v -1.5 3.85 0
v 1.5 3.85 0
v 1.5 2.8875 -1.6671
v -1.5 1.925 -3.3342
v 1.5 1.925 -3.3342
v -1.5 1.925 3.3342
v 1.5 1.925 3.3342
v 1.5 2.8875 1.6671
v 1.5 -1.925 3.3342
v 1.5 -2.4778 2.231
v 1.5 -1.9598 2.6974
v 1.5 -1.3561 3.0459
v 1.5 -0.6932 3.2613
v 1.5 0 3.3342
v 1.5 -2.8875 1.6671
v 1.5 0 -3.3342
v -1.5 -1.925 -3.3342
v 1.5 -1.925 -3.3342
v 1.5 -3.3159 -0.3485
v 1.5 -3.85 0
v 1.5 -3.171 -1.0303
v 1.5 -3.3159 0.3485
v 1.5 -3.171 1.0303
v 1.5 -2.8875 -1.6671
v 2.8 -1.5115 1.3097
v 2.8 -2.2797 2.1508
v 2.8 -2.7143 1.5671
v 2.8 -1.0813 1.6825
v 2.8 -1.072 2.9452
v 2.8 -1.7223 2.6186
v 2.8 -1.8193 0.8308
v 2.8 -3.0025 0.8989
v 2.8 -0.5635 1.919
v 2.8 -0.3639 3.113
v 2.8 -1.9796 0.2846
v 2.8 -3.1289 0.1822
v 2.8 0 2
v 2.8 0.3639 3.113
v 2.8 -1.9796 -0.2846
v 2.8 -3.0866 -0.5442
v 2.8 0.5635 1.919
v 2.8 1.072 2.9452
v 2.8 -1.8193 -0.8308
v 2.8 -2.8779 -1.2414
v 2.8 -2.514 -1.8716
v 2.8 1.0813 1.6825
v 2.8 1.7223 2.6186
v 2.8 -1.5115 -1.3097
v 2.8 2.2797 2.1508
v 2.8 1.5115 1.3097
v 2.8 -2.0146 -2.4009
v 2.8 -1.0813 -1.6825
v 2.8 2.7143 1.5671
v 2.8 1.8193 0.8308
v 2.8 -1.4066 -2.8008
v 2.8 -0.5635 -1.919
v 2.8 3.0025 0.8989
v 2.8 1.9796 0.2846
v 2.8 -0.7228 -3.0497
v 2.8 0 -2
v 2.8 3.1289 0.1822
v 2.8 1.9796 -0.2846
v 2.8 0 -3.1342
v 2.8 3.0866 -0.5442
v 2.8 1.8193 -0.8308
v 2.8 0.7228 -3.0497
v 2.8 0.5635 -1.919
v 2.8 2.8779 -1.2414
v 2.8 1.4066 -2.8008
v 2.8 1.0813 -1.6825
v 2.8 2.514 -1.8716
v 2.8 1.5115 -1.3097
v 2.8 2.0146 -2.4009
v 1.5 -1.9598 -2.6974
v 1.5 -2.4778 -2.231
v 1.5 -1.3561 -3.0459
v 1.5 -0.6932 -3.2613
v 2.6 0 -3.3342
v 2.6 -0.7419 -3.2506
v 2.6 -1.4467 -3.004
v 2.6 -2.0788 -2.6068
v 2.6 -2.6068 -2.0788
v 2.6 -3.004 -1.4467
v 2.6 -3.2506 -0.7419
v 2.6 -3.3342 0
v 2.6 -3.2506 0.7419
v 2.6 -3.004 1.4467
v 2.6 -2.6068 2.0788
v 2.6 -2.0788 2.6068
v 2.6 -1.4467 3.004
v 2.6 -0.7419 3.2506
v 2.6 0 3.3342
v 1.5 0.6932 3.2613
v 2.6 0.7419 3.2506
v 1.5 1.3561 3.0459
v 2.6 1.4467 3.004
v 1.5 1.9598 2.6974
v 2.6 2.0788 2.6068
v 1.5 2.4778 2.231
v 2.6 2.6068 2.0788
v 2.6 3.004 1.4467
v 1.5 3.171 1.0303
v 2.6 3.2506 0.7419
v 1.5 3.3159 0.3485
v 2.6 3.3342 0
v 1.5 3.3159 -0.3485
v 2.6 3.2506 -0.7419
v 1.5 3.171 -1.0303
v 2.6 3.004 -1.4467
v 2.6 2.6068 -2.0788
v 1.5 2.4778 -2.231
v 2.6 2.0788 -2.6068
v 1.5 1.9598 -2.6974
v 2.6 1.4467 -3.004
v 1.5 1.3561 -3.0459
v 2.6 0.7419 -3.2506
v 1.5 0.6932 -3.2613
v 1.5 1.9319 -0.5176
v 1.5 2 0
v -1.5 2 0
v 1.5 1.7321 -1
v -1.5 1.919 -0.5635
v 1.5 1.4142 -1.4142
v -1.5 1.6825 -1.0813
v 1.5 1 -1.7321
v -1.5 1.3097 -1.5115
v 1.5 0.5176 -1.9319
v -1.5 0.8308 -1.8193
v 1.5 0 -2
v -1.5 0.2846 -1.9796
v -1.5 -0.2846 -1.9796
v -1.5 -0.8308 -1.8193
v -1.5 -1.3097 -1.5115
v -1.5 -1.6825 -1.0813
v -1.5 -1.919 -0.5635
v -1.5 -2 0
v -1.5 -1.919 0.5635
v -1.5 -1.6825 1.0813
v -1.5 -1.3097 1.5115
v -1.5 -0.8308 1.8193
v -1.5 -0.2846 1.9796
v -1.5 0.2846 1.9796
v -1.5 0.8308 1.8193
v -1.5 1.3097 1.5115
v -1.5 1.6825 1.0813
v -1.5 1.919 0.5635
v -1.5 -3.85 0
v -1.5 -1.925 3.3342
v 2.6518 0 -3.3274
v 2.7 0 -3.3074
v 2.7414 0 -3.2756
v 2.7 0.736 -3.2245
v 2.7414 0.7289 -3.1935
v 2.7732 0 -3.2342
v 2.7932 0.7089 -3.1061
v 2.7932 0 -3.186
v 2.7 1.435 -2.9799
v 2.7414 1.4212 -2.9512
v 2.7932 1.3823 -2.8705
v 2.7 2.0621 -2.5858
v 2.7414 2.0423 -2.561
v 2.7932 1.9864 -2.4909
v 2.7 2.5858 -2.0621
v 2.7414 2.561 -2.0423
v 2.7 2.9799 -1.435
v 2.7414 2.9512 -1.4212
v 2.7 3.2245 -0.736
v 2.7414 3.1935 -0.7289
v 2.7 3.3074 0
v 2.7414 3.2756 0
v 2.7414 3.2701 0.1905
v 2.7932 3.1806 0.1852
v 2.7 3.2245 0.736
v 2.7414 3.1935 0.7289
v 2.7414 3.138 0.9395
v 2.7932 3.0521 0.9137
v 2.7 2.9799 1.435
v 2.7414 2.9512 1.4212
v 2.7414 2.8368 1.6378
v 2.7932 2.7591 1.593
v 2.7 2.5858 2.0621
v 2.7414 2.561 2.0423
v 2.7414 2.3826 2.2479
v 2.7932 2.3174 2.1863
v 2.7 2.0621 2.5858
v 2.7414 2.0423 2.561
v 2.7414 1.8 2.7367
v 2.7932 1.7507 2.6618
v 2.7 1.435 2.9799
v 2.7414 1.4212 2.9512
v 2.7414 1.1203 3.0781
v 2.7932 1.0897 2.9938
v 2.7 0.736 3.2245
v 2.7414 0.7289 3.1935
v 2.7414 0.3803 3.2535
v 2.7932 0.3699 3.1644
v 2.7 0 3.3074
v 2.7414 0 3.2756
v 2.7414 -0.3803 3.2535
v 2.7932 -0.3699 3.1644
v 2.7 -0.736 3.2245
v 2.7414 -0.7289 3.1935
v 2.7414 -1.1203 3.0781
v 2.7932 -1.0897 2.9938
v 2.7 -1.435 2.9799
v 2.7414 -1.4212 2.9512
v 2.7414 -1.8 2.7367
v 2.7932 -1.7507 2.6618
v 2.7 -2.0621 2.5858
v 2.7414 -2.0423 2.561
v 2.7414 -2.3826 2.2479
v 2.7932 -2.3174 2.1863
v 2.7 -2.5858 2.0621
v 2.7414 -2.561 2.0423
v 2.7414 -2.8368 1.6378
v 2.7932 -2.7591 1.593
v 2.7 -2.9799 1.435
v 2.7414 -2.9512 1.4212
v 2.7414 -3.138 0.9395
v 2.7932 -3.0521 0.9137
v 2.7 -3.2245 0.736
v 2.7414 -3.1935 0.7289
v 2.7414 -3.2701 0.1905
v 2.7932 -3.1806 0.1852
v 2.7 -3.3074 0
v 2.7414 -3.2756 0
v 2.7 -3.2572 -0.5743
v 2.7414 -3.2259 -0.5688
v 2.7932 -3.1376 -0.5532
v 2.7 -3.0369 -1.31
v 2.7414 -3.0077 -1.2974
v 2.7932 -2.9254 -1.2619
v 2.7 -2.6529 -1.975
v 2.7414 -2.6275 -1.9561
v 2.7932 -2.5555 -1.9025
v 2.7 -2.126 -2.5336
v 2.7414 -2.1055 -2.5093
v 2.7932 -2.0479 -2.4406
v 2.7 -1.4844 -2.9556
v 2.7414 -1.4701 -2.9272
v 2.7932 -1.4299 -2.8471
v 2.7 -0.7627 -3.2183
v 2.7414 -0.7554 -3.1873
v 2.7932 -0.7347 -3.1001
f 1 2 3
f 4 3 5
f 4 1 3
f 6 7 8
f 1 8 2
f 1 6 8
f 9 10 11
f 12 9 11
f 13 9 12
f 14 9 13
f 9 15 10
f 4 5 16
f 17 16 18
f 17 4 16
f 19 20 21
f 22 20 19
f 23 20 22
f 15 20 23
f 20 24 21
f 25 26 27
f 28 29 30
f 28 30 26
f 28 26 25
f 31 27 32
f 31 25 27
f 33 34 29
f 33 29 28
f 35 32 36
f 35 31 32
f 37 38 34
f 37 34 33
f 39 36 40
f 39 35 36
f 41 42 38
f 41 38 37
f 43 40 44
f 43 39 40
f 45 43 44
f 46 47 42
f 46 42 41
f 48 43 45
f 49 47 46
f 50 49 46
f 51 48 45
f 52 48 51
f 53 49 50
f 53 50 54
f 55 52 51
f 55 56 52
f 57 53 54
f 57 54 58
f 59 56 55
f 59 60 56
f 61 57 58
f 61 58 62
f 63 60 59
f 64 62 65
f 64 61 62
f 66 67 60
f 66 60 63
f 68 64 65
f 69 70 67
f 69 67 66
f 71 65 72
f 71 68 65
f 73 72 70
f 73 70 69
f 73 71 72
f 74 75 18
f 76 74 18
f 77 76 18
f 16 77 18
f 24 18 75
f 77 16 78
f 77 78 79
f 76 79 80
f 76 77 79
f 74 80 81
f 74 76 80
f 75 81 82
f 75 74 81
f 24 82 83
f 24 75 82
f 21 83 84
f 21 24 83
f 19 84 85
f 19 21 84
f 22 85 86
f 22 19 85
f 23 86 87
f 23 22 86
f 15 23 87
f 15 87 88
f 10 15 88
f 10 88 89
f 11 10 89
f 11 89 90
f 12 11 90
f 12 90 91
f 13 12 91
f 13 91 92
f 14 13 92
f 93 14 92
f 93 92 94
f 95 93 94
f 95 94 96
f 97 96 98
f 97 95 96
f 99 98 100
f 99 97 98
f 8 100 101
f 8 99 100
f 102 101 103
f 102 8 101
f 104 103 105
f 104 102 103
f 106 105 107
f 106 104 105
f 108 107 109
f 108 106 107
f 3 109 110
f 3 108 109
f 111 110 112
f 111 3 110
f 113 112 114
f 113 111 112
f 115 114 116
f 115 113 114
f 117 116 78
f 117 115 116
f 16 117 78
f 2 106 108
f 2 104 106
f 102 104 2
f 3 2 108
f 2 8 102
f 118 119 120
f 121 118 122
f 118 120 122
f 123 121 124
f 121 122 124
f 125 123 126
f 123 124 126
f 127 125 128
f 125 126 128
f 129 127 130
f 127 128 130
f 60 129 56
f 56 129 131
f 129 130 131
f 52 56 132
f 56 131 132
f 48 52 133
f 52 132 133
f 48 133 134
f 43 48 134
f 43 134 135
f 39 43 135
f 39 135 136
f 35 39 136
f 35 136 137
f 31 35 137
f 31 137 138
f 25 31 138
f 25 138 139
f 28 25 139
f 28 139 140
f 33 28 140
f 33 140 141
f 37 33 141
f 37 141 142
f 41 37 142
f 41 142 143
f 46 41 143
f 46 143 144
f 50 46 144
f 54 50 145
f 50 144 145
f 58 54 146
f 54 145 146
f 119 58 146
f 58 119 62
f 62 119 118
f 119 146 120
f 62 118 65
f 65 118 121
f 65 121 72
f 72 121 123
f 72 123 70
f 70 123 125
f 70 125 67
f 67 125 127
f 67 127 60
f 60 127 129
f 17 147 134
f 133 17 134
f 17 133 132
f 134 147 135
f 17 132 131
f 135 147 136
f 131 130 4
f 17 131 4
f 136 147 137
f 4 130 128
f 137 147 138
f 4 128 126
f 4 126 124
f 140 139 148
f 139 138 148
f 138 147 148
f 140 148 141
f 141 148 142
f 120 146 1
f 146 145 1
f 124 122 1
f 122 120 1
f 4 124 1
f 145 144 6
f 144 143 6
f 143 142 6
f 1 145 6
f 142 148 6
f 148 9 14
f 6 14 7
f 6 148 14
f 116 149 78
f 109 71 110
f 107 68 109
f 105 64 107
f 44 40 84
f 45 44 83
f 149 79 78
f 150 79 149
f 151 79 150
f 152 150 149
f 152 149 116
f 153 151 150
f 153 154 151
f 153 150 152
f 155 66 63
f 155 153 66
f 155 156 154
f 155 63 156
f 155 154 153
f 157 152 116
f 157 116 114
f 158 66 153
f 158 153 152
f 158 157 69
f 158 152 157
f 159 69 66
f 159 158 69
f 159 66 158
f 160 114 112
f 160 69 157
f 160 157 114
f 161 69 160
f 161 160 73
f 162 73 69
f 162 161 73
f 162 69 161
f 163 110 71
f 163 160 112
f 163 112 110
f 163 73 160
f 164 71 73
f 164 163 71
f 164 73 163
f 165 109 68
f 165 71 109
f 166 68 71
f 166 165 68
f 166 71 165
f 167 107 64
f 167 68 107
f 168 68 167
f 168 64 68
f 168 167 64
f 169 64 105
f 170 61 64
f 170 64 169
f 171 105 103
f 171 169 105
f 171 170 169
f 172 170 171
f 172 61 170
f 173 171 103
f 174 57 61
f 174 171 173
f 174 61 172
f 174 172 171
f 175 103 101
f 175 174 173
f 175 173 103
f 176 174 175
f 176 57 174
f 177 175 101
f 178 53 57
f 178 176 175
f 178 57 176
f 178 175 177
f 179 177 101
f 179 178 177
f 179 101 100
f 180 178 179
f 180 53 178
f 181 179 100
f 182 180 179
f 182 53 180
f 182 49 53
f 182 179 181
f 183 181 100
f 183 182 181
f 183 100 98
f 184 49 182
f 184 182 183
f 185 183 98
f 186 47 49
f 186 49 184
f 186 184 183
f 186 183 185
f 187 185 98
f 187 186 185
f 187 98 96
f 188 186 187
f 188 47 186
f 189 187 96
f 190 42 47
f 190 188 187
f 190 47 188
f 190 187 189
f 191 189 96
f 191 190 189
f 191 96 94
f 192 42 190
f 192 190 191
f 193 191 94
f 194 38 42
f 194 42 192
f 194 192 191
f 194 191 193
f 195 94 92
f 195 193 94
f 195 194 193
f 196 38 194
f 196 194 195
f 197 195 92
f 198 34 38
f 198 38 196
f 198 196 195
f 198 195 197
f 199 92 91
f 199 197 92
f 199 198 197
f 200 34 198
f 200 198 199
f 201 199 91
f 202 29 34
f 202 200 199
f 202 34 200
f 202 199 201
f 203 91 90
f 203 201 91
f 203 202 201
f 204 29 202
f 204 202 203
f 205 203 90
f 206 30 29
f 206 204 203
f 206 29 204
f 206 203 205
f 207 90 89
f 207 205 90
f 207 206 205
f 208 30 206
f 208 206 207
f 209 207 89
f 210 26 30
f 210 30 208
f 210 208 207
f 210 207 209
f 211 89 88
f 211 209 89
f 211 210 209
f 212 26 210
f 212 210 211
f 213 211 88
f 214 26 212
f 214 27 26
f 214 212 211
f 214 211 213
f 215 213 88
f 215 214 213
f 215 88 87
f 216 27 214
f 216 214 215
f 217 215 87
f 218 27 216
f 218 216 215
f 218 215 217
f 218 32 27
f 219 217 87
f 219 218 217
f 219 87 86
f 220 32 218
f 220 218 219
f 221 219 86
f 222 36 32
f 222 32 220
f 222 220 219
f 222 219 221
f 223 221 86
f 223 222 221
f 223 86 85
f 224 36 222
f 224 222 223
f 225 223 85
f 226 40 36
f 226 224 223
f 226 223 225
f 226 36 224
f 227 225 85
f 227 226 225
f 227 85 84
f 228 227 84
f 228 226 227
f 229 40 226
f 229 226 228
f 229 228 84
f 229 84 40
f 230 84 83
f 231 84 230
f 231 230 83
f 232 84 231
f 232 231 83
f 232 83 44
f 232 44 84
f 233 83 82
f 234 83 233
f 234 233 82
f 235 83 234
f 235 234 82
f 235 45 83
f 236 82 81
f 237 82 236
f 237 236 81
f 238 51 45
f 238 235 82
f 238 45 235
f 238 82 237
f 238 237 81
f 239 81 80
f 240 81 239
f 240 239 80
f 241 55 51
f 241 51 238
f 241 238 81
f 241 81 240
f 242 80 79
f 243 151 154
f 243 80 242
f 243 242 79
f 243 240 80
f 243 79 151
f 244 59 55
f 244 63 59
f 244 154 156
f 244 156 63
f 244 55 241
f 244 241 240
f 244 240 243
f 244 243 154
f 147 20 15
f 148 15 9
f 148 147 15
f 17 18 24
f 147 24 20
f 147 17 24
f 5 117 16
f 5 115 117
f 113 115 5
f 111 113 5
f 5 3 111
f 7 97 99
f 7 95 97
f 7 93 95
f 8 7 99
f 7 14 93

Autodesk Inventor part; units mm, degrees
ref_plane "YZ Plane" through (0, 0, 0) normal (1, 0, 0) x (0, 1, 0)
ref_plane "XZ Plane" through (0, 0, 0) normal (0, 1, 0) x (-1, 0, 0)
ref_plane "XY Plane" through (0, 0, 0) normal (0, 0, 1) x (1, 0, 0)
sketch "Sketch1" plane through (0, 0, 0) normal (1, 0, 0) x (0, 1, 0)
  circle A0 centre (0, 0) radius 3.85 construction
  line L0 (-3.85, 0) -> (-1.925, 3.3342)
  line L1 (-1.925, 3.3342) -> (1.925, 3.3342)
  line L2 (1.925, 3.3342) -> (3.85, 0)
  line L3 (3.85, 0) -> (1.925, -3.3342)
  line L4 (1.925, -3.3342) -> (-1.925, -3.3342)
  line L5 (-1.925, -3.3342) -> (-3.85, 0)
  circle A1 centre (0, 0) radius 2
  dimension "d0" = 7.7
  dimension "d1" = 4
extrude "Extrusion1" add sketch "Sketch1" along normal mid plane 3
sketch "Sketch2" plane through (1.5, 0, 0) normal (1, 0, 0) x (0, 0, -1)
  circle A0 centre (0, 0) radius 3.3342
  circle A1 centre (0, 0) radius 2
extrude "Extrusion2" add sketch "Sketch2" along normal blind 1.3
fillet "Fillet1" radius 0.2 1 edges at (2.8, 0, 3.3342)
thread "Thread1" size "M4x0.7" class "6H" standard "ANSI Metric M Profile" full length
properties part number "Nut 4mm self locking"
